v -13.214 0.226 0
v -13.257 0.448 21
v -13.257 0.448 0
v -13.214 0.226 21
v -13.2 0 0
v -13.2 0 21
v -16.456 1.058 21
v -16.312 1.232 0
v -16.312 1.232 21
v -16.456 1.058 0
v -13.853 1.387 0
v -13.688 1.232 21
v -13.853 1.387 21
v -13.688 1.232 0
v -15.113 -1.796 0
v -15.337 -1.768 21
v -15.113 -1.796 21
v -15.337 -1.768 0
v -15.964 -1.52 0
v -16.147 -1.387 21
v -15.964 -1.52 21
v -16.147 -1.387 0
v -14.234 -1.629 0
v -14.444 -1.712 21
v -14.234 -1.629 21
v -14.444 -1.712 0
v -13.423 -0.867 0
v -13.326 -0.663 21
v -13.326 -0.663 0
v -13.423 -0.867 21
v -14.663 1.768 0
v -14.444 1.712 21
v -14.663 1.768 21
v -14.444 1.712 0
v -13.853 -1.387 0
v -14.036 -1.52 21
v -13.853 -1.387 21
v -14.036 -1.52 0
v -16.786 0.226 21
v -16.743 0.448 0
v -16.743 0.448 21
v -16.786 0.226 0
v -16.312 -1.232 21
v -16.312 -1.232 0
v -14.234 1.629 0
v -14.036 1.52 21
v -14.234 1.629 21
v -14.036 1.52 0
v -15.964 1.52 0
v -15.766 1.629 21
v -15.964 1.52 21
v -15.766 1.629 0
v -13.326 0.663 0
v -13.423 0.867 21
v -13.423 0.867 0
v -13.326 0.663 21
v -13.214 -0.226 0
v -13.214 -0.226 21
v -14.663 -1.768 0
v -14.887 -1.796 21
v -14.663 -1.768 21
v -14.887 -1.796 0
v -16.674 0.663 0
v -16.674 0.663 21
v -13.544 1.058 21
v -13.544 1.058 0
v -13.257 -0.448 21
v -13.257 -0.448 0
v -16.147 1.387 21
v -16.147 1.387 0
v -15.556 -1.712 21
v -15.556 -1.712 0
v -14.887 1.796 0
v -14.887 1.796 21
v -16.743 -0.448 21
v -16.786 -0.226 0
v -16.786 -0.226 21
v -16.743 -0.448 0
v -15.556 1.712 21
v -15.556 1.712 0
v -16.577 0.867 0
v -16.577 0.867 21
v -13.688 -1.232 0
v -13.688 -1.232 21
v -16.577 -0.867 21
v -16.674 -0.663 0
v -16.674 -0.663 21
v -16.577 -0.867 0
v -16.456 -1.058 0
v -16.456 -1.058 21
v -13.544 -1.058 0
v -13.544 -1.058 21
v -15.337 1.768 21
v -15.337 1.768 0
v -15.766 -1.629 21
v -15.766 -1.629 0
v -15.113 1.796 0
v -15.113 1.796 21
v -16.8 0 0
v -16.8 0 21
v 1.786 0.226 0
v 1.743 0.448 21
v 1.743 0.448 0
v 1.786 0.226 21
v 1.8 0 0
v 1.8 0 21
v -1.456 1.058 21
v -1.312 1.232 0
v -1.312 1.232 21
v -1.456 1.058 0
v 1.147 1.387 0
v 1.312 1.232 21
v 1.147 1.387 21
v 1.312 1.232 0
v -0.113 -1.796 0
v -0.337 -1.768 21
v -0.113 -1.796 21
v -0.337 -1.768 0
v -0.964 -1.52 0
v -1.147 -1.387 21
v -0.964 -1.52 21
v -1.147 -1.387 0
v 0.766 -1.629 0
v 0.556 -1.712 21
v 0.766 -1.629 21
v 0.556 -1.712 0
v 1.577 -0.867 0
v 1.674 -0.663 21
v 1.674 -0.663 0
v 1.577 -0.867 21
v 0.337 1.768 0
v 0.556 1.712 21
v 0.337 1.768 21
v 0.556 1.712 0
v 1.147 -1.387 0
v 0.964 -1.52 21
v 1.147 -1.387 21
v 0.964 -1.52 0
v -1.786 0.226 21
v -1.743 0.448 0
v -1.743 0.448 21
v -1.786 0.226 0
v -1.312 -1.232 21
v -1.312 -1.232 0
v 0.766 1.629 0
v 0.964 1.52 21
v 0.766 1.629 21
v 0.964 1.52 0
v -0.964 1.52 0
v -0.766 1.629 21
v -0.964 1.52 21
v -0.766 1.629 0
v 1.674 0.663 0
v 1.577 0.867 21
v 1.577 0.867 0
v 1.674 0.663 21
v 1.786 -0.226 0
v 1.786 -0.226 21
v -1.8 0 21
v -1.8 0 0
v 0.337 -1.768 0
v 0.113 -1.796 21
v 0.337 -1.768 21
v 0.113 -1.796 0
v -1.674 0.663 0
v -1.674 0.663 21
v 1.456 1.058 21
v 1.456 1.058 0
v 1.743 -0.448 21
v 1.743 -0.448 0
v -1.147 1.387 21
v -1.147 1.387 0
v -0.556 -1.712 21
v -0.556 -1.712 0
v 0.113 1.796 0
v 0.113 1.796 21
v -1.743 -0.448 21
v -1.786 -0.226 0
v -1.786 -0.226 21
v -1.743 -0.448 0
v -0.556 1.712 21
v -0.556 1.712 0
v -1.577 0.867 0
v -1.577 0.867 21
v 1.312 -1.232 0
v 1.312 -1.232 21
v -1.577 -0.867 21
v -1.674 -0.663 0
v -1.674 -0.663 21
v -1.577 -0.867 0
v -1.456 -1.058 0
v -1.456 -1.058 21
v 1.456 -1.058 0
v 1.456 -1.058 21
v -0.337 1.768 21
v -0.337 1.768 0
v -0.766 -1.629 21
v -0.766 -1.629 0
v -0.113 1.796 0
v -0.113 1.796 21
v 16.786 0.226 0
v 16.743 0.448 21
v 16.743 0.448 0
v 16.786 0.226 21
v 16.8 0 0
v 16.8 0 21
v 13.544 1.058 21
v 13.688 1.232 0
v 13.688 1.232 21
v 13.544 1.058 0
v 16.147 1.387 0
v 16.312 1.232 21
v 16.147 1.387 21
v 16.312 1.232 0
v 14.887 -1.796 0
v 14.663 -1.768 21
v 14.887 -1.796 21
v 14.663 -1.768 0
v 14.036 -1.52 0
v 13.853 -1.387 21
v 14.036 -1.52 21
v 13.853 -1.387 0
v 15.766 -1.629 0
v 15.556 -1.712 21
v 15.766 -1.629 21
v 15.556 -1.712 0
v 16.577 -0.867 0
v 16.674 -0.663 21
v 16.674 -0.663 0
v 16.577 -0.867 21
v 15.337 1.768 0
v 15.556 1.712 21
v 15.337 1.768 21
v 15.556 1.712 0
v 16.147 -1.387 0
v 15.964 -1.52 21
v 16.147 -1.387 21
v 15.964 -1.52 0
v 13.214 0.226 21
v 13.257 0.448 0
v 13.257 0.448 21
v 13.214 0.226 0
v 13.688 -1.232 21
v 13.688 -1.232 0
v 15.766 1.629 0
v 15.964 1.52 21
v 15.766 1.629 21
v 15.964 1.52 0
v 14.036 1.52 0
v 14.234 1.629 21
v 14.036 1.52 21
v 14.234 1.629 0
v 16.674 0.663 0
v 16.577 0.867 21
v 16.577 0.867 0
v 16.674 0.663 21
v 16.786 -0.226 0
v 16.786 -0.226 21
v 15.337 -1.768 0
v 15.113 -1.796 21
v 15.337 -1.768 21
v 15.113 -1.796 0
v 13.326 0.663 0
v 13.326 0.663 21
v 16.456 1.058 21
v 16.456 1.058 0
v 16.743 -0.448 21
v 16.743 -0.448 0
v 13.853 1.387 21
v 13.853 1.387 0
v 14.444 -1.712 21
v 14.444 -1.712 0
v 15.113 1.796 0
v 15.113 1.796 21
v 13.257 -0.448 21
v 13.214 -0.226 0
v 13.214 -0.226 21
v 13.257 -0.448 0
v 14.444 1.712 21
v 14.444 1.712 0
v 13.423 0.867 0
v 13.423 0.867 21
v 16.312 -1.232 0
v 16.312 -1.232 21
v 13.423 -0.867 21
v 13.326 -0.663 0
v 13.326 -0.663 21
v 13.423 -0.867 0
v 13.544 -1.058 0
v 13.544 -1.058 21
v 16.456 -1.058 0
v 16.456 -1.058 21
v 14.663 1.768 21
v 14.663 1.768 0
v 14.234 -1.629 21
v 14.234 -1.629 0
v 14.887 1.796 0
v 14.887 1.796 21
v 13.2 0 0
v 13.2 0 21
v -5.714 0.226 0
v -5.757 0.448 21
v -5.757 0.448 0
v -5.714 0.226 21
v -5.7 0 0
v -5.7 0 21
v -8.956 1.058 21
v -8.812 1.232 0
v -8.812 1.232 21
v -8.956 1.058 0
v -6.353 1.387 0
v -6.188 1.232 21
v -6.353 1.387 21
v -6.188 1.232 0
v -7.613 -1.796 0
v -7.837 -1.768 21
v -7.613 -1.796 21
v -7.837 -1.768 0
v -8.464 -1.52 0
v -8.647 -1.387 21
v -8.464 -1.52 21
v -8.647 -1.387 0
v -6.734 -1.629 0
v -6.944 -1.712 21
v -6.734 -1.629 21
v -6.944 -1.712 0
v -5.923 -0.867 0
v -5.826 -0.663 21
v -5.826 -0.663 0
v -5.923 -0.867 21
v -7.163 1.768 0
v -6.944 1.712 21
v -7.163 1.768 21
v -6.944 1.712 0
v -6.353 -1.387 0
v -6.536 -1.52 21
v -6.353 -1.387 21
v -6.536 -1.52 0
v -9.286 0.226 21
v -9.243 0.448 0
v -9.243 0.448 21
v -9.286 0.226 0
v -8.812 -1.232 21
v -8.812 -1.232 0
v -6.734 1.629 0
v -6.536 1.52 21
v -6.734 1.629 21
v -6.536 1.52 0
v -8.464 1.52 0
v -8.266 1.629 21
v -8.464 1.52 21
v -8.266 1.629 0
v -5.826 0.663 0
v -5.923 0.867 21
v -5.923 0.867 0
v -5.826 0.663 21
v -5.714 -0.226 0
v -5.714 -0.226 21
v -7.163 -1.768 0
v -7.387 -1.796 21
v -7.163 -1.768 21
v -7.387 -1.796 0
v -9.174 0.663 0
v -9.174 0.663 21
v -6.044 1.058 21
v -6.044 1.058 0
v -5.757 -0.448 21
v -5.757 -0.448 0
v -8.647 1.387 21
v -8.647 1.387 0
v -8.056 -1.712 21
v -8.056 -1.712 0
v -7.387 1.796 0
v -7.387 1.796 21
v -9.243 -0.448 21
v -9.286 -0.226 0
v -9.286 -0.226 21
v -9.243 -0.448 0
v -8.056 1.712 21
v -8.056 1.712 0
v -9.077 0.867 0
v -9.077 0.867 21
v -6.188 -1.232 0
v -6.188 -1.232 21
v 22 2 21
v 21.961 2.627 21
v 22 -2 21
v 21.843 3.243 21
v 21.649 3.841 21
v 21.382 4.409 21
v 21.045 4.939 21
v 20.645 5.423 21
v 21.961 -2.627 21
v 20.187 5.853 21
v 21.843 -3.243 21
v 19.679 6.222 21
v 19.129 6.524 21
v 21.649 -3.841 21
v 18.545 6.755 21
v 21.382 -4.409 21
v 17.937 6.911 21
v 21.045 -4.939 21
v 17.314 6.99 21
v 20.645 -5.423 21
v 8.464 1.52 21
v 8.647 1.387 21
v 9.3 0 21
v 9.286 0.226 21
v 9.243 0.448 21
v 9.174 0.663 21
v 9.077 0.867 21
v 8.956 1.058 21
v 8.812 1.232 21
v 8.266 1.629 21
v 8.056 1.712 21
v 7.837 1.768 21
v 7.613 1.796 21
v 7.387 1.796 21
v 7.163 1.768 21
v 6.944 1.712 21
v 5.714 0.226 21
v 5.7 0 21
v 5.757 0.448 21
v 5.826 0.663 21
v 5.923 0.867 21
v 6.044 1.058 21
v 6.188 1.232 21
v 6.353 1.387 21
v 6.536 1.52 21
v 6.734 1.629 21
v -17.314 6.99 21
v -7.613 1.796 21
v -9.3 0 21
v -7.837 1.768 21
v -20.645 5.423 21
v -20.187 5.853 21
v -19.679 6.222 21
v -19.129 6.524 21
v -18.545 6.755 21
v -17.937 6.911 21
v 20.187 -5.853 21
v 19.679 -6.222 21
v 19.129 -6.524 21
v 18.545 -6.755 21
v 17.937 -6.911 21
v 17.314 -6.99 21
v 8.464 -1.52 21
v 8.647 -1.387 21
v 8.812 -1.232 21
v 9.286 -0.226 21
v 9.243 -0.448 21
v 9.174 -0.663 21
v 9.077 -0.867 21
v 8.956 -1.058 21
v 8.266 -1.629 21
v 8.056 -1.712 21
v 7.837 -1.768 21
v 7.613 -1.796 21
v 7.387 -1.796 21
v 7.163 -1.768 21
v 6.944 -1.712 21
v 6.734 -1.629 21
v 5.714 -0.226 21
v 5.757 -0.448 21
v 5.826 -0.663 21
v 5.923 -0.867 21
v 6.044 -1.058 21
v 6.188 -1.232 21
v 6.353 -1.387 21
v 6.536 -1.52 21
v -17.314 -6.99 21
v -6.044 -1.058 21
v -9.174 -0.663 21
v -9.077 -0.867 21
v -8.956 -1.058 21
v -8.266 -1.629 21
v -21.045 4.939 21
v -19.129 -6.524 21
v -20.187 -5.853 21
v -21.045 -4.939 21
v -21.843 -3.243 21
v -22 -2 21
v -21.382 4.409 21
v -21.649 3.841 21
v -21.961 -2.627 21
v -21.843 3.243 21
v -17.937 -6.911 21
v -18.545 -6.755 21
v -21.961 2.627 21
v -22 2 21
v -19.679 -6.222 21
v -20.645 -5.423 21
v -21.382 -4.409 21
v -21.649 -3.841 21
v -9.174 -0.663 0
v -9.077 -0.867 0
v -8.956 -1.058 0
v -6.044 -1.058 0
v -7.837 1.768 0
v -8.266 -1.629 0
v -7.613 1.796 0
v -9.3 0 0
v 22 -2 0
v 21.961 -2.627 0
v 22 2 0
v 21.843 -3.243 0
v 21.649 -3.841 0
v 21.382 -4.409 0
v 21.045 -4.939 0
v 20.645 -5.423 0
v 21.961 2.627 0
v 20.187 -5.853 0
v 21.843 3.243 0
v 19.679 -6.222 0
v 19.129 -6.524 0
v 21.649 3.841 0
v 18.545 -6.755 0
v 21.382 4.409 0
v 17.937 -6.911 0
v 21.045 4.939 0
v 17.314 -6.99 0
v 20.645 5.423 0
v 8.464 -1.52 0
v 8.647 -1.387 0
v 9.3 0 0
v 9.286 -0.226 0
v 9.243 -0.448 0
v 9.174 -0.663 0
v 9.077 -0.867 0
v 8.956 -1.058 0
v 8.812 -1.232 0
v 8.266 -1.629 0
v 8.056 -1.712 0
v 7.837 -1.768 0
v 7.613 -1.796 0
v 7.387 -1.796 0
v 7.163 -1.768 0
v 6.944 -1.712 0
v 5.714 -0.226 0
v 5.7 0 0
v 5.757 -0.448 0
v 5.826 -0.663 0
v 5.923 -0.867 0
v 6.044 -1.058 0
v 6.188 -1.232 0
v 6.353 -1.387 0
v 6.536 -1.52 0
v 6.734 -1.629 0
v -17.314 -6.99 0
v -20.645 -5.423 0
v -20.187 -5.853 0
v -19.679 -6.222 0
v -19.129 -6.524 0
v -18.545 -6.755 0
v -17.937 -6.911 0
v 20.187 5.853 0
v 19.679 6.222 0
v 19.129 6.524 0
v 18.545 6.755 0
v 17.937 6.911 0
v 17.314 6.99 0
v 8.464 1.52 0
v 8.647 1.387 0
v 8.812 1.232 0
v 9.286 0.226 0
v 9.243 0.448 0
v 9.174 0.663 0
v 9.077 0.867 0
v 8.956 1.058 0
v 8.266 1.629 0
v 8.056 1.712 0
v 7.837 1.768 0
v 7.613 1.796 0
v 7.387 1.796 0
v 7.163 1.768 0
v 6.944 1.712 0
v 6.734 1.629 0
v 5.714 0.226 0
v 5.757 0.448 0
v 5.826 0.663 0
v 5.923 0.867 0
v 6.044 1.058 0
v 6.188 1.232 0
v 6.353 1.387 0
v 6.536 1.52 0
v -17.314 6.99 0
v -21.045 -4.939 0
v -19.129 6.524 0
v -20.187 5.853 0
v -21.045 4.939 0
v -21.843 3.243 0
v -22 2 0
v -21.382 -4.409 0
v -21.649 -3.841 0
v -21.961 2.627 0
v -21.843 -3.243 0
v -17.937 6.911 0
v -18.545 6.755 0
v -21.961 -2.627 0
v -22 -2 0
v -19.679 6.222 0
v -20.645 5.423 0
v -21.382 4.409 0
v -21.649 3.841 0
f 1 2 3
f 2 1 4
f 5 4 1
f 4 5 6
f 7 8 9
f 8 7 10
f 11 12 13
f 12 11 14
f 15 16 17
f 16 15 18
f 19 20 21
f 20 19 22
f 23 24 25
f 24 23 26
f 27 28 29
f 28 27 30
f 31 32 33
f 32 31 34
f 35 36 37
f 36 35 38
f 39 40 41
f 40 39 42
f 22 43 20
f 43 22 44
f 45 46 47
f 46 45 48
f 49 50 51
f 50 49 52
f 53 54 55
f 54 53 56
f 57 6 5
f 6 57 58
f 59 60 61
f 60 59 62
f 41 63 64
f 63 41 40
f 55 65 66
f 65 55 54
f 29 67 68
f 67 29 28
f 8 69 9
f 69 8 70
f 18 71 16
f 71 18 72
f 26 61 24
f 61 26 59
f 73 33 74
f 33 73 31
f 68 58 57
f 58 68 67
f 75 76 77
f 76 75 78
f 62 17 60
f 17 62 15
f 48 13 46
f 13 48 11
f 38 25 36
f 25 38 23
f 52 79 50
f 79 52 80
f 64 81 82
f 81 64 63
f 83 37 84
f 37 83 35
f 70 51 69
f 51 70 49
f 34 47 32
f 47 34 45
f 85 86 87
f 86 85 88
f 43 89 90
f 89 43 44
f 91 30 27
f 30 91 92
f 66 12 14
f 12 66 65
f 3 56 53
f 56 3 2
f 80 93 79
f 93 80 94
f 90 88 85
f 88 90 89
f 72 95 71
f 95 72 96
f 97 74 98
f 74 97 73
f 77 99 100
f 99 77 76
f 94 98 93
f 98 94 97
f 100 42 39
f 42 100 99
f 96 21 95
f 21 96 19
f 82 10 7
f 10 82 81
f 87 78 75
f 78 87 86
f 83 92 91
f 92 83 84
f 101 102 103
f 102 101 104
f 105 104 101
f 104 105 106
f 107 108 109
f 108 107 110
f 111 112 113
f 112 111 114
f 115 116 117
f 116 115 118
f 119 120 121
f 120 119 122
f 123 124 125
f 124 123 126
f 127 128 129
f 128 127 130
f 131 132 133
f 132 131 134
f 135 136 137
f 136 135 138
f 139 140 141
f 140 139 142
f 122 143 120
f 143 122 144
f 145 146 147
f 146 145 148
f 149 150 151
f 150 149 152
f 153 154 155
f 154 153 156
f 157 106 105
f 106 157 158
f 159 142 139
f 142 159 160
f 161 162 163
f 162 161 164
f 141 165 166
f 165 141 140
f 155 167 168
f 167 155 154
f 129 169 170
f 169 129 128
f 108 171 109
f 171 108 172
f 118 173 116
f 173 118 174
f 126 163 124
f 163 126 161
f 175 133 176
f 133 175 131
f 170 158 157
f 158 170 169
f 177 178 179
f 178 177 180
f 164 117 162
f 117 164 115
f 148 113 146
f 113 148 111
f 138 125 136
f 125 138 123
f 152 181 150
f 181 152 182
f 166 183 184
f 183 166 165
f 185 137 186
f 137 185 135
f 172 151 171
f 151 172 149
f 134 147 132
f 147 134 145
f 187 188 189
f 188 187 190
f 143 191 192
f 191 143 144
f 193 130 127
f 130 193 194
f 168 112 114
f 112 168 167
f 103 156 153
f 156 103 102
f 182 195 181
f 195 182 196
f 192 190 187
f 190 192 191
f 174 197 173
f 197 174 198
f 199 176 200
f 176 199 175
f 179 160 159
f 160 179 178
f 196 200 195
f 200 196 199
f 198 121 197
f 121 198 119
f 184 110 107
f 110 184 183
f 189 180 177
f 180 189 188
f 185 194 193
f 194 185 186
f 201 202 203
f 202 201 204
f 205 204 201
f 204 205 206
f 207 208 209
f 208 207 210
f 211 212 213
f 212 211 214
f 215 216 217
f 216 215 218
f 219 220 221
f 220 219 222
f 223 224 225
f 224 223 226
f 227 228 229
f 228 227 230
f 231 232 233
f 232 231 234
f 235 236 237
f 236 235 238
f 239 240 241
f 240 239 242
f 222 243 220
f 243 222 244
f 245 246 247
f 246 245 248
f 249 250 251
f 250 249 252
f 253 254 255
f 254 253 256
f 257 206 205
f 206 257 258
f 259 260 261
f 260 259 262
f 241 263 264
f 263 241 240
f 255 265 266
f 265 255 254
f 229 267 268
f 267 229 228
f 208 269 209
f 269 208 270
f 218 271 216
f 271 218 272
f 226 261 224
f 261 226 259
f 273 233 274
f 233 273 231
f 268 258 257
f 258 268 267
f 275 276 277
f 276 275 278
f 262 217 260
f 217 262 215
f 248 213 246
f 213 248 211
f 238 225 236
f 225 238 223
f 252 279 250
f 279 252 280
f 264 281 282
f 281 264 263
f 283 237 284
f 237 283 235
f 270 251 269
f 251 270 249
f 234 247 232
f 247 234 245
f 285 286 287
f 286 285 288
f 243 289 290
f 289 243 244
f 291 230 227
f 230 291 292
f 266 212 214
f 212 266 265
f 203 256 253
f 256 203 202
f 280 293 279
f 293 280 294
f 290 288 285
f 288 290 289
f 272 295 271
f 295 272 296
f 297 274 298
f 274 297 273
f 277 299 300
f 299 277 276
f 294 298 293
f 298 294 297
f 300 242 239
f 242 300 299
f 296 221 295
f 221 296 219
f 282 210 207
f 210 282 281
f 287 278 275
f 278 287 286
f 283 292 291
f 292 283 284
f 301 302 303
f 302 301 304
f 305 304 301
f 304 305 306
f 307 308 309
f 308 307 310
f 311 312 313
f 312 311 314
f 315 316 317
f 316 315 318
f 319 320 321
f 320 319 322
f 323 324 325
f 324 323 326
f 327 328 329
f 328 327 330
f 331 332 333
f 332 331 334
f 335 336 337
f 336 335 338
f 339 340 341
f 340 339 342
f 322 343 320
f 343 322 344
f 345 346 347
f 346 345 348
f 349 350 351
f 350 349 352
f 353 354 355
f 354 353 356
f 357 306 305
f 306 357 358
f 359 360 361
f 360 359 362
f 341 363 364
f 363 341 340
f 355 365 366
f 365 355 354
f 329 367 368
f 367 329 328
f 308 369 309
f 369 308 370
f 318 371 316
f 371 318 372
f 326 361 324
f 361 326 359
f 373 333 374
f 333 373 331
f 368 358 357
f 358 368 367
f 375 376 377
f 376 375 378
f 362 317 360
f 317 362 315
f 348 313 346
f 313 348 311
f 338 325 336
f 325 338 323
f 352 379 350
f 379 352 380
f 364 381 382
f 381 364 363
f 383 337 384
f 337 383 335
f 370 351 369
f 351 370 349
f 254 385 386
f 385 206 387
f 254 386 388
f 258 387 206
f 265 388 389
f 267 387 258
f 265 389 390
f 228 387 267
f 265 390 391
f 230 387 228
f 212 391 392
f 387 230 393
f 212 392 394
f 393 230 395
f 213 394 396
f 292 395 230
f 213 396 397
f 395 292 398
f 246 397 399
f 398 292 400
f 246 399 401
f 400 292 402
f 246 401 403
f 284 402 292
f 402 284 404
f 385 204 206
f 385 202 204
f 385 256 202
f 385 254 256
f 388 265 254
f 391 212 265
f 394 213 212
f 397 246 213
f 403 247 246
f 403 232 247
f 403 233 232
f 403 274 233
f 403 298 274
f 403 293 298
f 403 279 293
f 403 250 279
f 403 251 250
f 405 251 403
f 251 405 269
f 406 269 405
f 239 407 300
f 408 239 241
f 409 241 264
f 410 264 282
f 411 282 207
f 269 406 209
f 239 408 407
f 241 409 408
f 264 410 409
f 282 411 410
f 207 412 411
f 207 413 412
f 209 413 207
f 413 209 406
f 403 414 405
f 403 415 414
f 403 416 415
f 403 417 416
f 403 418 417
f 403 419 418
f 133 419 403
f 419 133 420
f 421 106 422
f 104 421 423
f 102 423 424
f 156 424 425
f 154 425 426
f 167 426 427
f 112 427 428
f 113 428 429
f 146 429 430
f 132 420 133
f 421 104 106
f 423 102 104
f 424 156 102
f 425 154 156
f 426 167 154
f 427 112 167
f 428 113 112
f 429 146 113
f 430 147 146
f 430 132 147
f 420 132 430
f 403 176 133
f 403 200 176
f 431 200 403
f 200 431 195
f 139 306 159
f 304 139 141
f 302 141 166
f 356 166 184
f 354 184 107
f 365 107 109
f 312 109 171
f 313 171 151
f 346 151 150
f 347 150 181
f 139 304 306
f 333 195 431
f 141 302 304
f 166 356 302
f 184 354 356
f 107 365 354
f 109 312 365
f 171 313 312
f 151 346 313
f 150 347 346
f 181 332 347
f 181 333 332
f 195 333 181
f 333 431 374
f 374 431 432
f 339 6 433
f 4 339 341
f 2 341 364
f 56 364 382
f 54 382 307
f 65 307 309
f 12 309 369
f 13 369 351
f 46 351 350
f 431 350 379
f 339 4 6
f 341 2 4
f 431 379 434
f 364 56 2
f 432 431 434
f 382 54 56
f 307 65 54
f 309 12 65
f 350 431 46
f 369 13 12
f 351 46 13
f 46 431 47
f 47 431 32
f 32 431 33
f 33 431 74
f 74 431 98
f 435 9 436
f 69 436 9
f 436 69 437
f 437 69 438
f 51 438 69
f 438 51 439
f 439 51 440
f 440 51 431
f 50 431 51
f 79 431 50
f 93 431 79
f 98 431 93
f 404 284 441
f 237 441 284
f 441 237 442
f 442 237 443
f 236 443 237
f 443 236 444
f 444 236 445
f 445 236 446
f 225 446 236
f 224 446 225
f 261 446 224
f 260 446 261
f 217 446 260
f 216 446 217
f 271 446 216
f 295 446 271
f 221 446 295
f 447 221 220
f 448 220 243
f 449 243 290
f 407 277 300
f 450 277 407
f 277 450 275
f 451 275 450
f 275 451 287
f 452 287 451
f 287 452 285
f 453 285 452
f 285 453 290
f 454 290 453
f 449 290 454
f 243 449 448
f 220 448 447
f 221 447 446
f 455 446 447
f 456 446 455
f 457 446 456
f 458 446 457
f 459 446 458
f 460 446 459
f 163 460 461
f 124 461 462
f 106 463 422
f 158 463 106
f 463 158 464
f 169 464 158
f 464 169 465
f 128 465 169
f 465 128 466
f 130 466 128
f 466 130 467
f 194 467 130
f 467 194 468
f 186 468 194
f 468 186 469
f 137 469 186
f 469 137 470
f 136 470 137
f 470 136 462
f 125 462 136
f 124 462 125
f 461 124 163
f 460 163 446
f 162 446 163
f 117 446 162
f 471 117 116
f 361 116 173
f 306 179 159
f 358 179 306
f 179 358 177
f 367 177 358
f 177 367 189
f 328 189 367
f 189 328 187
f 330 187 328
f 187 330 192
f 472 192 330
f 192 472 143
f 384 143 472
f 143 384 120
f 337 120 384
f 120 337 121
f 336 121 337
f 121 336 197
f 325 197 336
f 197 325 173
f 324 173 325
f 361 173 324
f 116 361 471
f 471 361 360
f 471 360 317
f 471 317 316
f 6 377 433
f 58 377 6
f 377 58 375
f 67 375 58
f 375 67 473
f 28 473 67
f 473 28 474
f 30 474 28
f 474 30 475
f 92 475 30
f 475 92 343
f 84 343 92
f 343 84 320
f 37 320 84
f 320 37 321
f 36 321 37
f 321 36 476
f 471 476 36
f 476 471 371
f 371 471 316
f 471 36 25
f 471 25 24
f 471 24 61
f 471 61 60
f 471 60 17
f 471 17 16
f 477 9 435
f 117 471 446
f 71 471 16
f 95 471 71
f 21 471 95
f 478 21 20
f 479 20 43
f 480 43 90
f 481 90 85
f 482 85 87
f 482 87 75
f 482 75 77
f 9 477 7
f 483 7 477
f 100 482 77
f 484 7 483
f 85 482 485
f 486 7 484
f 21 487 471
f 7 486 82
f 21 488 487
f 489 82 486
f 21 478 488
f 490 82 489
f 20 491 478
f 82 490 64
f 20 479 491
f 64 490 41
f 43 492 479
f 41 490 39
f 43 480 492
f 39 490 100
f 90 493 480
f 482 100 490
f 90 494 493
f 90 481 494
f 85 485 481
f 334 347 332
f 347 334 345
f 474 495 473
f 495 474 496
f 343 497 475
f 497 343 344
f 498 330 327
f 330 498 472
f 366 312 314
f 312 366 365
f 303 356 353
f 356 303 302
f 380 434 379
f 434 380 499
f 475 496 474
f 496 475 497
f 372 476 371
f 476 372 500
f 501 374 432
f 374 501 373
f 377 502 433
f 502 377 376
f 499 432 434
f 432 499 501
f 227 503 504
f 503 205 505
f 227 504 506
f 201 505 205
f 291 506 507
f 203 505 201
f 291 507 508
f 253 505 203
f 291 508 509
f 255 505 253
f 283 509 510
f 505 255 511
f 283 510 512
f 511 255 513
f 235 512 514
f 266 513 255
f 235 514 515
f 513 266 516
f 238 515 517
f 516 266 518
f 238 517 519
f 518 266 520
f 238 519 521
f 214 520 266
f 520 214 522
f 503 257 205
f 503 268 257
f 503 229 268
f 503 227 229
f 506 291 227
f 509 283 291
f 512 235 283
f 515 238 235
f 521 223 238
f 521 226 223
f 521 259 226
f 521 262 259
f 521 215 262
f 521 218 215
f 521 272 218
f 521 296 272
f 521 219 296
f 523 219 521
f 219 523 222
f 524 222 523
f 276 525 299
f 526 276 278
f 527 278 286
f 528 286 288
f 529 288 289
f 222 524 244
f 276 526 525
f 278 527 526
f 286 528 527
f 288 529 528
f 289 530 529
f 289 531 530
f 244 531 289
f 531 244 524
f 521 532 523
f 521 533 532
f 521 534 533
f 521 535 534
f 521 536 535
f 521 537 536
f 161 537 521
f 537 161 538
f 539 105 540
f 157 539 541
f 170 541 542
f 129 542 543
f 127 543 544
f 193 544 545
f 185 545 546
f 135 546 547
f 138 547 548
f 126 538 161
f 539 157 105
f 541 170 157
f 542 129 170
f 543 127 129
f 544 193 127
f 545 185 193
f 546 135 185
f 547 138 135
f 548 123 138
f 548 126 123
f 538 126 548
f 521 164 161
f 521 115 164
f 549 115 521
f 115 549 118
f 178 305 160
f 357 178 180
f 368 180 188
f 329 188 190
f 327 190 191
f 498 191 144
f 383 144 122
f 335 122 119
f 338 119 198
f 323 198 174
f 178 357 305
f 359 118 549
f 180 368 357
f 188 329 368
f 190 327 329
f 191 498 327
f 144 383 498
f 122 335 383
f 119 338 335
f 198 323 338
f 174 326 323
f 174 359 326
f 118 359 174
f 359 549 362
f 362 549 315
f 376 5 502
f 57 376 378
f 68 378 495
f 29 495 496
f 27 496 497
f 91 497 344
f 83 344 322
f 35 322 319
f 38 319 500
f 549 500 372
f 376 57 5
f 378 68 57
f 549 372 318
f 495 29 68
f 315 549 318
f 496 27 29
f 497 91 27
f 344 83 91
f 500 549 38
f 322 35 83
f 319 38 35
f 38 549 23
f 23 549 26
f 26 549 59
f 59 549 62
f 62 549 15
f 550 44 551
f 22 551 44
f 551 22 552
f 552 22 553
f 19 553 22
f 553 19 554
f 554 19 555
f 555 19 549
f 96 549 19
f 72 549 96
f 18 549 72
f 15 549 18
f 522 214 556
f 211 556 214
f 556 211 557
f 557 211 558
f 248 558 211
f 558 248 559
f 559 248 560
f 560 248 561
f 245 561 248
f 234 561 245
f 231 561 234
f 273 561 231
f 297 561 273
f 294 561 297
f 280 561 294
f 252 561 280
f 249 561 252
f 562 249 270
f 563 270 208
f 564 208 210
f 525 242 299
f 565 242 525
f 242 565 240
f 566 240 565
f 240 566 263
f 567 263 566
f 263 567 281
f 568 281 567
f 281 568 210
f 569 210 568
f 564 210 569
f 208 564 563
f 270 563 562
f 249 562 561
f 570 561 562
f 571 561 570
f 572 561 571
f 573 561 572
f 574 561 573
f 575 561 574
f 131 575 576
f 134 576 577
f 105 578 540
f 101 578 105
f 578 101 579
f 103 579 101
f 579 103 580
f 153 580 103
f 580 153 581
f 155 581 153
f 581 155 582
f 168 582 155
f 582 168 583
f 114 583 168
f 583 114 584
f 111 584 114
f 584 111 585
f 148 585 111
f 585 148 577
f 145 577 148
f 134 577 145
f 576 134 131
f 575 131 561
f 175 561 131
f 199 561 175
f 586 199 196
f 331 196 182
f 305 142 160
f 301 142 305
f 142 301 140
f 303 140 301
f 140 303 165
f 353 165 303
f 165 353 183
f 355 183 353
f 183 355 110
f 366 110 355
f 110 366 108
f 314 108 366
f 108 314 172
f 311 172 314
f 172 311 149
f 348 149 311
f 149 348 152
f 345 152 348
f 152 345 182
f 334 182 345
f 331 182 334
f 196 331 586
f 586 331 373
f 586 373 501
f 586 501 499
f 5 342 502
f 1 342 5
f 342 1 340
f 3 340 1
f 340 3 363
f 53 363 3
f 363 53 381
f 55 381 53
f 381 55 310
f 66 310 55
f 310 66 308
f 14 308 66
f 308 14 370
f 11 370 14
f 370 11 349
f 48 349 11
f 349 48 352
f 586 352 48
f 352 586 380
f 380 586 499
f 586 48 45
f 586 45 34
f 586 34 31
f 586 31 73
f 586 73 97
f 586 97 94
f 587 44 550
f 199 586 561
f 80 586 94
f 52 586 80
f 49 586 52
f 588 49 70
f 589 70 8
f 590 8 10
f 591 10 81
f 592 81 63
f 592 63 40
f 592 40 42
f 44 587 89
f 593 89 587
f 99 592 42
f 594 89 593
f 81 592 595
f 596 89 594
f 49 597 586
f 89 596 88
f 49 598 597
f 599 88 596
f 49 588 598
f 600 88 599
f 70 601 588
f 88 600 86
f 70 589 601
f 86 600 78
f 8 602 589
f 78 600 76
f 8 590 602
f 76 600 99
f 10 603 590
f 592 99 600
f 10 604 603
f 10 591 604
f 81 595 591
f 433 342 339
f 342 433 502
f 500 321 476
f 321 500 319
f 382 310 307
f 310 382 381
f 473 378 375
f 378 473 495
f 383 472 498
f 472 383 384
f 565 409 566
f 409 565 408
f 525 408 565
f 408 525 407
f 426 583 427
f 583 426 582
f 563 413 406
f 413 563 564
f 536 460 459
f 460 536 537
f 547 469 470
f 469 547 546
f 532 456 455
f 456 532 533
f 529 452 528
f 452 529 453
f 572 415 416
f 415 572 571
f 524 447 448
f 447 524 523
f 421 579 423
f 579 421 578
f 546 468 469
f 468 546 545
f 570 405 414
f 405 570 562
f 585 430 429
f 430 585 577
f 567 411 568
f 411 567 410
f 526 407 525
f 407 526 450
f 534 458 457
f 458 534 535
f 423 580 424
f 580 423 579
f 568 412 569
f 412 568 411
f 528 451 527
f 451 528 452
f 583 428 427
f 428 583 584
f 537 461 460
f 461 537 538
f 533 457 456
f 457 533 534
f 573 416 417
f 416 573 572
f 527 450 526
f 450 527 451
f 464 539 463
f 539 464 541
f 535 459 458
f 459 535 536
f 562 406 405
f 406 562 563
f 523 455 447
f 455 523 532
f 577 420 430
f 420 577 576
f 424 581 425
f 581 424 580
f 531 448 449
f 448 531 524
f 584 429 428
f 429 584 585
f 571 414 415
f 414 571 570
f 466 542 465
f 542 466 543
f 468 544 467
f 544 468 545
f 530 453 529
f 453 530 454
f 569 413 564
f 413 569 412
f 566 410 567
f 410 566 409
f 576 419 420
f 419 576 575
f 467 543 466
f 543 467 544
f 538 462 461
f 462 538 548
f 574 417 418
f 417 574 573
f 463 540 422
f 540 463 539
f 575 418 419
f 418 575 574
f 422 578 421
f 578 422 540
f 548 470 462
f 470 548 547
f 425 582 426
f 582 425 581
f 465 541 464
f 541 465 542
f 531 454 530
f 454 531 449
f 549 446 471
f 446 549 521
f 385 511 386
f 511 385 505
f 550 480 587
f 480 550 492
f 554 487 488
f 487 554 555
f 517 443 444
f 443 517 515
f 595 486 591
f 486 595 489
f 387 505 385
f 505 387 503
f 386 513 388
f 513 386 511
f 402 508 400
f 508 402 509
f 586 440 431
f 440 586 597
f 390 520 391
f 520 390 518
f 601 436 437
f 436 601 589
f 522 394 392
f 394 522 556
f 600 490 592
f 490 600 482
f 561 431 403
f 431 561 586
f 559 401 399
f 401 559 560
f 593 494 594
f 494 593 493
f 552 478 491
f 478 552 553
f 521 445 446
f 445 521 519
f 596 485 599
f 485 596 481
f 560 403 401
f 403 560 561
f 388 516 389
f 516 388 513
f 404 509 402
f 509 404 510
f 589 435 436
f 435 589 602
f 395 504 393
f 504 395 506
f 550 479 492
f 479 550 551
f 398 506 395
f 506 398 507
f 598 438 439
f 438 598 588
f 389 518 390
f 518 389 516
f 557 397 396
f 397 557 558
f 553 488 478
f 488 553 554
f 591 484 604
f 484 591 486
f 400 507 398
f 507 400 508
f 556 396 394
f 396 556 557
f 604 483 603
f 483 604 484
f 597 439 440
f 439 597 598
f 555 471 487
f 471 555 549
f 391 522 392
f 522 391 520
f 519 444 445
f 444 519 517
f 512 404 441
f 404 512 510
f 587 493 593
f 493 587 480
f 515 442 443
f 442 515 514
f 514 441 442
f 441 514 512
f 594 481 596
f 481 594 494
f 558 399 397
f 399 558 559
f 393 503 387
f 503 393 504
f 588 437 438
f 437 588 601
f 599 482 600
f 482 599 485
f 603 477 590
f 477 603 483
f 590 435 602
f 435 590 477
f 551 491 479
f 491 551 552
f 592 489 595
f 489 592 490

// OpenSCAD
$fn = 50;


difference() {
	union() {
		hull() {
			translate(v = [-17.0000000000, 2.0000000000, 0]) {
				cylinder(h = 21, r = 5);
			}
			translate(v = [17.0000000000, 2.0000000000, 0]) {
				cylinder(h = 21, r = 5);
			}
			translate(v = [-17.0000000000, -2.0000000000, 0]) {
				cylinder(h = 21, r = 5);
			}
			translate(v = [17.0000000000, -2.0000000000, 0]) {
				cylinder(h = 21, r = 5);
			}
		}
	}
	union() {
		translate(v = [-15.0000000000, 0.0000000000, -100.0000000000]) {
			cylinder(h = 200, r = 1.8000000000);
		}
		translate(v = [0.0000000000, 0.0000000000, -100.0000000000]) {
			cylinder(h = 200, r = 1.8000000000);
		}
		translate(v = [15.0000000000, 0.0000000000, -100.0000000000]) {
			cylinder(h = 200, r = 1.8000000000);
		}
		translate(v = [-15.0000000000, 0.0000000000, 0]) {
			cylinder(h = 21, r = 1.8000000000);
		}
		translate(v = [-7.5000000000, 0.0000000000, 0]) {
			cylinder(h = 21, r = 1.8000000000);
		}
		cylinder(h = 21, r = 1.8000000000);
		translate(v = [7.5000000000, 0.0000000000, 0]) {
			cylinder(h = 21, r = 1.8000000000);
		}
		translate(v = [15.0000000000, 0.0000000000, 0]) {
			cylinder(h = 21, r = 1.8000000000);
		}
		translate(v = [-15.0000000000, 0.0000000000, 0]) {
			cylinder(h = 21, r = 1.8000000000);
		}
		translate(v = [-7.5000000000, 0.0000000000, 0]) {
			cylinder(h = 21, r = 1.8000000000);
		}
		cylinder(h = 21, r = 1.8000000000);
		translate(v = [7.5000000000, 0.0000000000, 0]) {
			cylinder(h = 21, r = 1.8000000000);
		}
		translate(v = [15.0000000000, 0.0000000000, 0]) {
			cylinder(h = 21, r = 1.8000000000);
		}
		translate(v = [-15.0000000000, 0.0000000000, 0]) {
			cylinder(h = 21, r = 1.8000000000);
		}
		translate(v = [-7.5000000000, 0.0000000000, 0]) {
			cylinder(h = 21, r = 1.8000000000);
		}
		cylinder(h = 21, r = 1.8000000000);
		translate(v = [7.5000000000, 0.0000000000, 0]) {
			cylinder(h = 21, r = 1.8000000000);
		}
		translate(v = [15.0000000000, 0.0000000000, 0]) {
			cylinder(h = 21, r = 1.8000000000);
		}
	}
}
